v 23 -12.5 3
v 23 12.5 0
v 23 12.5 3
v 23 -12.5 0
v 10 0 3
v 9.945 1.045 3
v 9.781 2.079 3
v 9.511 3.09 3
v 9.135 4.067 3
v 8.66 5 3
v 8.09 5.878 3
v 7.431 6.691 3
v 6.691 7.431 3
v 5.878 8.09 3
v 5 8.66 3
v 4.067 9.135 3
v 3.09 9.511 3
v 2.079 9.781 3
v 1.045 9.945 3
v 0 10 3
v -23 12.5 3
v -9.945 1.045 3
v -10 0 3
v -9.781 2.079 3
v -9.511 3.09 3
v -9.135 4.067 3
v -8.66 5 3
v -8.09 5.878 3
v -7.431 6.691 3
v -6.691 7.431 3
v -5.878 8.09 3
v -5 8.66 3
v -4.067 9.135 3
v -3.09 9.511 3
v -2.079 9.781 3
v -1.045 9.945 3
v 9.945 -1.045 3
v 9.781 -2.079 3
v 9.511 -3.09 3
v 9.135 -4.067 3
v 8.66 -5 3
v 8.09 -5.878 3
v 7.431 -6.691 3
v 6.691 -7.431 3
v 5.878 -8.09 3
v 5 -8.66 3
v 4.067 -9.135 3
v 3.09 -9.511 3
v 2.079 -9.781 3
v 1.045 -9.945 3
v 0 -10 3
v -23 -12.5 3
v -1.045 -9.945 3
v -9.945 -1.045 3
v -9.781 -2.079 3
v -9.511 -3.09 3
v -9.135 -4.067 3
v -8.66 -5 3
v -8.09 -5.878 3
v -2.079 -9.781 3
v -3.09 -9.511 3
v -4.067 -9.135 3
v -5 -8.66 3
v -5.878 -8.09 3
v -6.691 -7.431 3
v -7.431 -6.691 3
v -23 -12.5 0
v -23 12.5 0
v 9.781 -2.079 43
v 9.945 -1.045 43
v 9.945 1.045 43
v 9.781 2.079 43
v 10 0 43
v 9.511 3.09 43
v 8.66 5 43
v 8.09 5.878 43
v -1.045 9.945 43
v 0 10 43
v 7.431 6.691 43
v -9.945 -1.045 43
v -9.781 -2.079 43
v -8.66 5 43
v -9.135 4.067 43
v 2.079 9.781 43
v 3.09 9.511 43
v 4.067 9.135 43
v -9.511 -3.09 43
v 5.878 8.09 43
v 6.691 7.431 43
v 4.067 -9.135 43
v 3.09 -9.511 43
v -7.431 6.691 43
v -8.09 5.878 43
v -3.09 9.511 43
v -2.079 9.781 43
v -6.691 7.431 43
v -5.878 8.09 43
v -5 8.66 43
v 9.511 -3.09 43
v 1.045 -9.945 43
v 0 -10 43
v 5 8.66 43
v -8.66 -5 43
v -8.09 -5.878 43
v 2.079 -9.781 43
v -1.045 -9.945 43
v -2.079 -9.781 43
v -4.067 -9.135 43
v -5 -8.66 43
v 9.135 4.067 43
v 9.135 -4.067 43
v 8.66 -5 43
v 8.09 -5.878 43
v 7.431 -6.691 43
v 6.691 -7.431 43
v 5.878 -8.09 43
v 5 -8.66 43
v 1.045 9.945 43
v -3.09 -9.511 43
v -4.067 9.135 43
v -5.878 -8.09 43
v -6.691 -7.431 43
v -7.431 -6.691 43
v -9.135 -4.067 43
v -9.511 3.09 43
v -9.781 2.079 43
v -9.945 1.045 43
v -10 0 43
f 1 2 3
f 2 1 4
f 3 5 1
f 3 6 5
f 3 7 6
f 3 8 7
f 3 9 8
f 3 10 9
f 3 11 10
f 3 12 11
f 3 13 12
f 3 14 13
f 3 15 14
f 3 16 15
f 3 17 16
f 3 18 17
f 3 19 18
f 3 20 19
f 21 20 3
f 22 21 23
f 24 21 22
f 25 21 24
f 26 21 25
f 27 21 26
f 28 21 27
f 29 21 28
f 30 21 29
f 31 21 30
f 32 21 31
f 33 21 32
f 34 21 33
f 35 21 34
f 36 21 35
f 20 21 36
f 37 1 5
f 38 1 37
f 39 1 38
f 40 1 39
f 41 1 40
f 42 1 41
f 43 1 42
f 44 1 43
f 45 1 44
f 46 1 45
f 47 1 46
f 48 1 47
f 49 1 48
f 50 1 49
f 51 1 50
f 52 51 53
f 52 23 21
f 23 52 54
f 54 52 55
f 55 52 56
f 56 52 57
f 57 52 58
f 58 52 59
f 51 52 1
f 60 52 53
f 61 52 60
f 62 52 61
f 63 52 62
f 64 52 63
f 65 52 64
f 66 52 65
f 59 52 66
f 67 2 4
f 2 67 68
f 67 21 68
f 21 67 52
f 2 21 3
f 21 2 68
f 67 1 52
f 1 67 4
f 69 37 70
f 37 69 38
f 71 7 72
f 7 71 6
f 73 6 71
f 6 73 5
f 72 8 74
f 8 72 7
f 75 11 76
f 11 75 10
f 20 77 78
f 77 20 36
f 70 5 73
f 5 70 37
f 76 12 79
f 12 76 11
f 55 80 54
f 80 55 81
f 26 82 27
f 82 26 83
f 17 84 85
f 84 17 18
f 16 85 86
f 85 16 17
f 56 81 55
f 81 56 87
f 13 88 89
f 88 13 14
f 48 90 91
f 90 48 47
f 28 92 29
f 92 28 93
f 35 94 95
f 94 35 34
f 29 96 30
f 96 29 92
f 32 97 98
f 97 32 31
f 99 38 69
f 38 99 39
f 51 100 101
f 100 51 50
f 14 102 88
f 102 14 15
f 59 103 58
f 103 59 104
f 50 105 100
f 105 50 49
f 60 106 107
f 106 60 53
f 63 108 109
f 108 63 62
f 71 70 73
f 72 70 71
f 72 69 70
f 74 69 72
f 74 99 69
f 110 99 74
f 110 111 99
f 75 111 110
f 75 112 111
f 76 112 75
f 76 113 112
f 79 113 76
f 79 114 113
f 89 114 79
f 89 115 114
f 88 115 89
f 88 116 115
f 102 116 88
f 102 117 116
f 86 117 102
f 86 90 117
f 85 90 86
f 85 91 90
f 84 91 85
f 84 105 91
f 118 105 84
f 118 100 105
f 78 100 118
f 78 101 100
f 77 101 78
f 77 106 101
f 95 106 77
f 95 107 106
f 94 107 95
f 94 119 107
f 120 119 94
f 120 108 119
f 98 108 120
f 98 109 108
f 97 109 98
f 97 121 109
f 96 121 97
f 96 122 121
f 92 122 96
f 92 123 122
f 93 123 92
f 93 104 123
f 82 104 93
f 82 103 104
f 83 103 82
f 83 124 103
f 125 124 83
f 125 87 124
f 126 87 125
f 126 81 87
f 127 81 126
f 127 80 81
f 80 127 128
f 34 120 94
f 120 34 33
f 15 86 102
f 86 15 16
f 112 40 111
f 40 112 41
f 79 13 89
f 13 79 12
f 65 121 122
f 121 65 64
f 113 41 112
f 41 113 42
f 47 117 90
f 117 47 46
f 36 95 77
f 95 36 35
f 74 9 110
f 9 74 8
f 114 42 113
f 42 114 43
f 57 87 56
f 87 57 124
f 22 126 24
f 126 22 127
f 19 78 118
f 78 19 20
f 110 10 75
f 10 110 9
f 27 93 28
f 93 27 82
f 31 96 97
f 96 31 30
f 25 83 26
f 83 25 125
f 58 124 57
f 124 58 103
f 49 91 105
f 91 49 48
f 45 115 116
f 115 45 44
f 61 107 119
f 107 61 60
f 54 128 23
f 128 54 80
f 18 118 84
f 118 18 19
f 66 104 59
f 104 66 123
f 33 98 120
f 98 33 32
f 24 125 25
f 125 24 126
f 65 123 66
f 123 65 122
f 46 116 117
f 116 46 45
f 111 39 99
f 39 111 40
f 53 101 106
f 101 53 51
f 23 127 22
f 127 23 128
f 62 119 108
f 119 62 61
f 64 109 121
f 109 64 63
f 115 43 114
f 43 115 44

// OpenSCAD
// T-head slot bolt.
$fn = 60;
eps = 0.02;
shaft_d = 20;
head_l = 46;
shaft_l = 40;
head_w = shaft_d + 5;
head_h = 3;
union() {
    translate([-head_l/2,-head_w/2,0]) cube([head_l,head_w,head_h]);
    translate([0,0,head_h]) cylinder(d=shaft_d,h=shaft_l);
}
